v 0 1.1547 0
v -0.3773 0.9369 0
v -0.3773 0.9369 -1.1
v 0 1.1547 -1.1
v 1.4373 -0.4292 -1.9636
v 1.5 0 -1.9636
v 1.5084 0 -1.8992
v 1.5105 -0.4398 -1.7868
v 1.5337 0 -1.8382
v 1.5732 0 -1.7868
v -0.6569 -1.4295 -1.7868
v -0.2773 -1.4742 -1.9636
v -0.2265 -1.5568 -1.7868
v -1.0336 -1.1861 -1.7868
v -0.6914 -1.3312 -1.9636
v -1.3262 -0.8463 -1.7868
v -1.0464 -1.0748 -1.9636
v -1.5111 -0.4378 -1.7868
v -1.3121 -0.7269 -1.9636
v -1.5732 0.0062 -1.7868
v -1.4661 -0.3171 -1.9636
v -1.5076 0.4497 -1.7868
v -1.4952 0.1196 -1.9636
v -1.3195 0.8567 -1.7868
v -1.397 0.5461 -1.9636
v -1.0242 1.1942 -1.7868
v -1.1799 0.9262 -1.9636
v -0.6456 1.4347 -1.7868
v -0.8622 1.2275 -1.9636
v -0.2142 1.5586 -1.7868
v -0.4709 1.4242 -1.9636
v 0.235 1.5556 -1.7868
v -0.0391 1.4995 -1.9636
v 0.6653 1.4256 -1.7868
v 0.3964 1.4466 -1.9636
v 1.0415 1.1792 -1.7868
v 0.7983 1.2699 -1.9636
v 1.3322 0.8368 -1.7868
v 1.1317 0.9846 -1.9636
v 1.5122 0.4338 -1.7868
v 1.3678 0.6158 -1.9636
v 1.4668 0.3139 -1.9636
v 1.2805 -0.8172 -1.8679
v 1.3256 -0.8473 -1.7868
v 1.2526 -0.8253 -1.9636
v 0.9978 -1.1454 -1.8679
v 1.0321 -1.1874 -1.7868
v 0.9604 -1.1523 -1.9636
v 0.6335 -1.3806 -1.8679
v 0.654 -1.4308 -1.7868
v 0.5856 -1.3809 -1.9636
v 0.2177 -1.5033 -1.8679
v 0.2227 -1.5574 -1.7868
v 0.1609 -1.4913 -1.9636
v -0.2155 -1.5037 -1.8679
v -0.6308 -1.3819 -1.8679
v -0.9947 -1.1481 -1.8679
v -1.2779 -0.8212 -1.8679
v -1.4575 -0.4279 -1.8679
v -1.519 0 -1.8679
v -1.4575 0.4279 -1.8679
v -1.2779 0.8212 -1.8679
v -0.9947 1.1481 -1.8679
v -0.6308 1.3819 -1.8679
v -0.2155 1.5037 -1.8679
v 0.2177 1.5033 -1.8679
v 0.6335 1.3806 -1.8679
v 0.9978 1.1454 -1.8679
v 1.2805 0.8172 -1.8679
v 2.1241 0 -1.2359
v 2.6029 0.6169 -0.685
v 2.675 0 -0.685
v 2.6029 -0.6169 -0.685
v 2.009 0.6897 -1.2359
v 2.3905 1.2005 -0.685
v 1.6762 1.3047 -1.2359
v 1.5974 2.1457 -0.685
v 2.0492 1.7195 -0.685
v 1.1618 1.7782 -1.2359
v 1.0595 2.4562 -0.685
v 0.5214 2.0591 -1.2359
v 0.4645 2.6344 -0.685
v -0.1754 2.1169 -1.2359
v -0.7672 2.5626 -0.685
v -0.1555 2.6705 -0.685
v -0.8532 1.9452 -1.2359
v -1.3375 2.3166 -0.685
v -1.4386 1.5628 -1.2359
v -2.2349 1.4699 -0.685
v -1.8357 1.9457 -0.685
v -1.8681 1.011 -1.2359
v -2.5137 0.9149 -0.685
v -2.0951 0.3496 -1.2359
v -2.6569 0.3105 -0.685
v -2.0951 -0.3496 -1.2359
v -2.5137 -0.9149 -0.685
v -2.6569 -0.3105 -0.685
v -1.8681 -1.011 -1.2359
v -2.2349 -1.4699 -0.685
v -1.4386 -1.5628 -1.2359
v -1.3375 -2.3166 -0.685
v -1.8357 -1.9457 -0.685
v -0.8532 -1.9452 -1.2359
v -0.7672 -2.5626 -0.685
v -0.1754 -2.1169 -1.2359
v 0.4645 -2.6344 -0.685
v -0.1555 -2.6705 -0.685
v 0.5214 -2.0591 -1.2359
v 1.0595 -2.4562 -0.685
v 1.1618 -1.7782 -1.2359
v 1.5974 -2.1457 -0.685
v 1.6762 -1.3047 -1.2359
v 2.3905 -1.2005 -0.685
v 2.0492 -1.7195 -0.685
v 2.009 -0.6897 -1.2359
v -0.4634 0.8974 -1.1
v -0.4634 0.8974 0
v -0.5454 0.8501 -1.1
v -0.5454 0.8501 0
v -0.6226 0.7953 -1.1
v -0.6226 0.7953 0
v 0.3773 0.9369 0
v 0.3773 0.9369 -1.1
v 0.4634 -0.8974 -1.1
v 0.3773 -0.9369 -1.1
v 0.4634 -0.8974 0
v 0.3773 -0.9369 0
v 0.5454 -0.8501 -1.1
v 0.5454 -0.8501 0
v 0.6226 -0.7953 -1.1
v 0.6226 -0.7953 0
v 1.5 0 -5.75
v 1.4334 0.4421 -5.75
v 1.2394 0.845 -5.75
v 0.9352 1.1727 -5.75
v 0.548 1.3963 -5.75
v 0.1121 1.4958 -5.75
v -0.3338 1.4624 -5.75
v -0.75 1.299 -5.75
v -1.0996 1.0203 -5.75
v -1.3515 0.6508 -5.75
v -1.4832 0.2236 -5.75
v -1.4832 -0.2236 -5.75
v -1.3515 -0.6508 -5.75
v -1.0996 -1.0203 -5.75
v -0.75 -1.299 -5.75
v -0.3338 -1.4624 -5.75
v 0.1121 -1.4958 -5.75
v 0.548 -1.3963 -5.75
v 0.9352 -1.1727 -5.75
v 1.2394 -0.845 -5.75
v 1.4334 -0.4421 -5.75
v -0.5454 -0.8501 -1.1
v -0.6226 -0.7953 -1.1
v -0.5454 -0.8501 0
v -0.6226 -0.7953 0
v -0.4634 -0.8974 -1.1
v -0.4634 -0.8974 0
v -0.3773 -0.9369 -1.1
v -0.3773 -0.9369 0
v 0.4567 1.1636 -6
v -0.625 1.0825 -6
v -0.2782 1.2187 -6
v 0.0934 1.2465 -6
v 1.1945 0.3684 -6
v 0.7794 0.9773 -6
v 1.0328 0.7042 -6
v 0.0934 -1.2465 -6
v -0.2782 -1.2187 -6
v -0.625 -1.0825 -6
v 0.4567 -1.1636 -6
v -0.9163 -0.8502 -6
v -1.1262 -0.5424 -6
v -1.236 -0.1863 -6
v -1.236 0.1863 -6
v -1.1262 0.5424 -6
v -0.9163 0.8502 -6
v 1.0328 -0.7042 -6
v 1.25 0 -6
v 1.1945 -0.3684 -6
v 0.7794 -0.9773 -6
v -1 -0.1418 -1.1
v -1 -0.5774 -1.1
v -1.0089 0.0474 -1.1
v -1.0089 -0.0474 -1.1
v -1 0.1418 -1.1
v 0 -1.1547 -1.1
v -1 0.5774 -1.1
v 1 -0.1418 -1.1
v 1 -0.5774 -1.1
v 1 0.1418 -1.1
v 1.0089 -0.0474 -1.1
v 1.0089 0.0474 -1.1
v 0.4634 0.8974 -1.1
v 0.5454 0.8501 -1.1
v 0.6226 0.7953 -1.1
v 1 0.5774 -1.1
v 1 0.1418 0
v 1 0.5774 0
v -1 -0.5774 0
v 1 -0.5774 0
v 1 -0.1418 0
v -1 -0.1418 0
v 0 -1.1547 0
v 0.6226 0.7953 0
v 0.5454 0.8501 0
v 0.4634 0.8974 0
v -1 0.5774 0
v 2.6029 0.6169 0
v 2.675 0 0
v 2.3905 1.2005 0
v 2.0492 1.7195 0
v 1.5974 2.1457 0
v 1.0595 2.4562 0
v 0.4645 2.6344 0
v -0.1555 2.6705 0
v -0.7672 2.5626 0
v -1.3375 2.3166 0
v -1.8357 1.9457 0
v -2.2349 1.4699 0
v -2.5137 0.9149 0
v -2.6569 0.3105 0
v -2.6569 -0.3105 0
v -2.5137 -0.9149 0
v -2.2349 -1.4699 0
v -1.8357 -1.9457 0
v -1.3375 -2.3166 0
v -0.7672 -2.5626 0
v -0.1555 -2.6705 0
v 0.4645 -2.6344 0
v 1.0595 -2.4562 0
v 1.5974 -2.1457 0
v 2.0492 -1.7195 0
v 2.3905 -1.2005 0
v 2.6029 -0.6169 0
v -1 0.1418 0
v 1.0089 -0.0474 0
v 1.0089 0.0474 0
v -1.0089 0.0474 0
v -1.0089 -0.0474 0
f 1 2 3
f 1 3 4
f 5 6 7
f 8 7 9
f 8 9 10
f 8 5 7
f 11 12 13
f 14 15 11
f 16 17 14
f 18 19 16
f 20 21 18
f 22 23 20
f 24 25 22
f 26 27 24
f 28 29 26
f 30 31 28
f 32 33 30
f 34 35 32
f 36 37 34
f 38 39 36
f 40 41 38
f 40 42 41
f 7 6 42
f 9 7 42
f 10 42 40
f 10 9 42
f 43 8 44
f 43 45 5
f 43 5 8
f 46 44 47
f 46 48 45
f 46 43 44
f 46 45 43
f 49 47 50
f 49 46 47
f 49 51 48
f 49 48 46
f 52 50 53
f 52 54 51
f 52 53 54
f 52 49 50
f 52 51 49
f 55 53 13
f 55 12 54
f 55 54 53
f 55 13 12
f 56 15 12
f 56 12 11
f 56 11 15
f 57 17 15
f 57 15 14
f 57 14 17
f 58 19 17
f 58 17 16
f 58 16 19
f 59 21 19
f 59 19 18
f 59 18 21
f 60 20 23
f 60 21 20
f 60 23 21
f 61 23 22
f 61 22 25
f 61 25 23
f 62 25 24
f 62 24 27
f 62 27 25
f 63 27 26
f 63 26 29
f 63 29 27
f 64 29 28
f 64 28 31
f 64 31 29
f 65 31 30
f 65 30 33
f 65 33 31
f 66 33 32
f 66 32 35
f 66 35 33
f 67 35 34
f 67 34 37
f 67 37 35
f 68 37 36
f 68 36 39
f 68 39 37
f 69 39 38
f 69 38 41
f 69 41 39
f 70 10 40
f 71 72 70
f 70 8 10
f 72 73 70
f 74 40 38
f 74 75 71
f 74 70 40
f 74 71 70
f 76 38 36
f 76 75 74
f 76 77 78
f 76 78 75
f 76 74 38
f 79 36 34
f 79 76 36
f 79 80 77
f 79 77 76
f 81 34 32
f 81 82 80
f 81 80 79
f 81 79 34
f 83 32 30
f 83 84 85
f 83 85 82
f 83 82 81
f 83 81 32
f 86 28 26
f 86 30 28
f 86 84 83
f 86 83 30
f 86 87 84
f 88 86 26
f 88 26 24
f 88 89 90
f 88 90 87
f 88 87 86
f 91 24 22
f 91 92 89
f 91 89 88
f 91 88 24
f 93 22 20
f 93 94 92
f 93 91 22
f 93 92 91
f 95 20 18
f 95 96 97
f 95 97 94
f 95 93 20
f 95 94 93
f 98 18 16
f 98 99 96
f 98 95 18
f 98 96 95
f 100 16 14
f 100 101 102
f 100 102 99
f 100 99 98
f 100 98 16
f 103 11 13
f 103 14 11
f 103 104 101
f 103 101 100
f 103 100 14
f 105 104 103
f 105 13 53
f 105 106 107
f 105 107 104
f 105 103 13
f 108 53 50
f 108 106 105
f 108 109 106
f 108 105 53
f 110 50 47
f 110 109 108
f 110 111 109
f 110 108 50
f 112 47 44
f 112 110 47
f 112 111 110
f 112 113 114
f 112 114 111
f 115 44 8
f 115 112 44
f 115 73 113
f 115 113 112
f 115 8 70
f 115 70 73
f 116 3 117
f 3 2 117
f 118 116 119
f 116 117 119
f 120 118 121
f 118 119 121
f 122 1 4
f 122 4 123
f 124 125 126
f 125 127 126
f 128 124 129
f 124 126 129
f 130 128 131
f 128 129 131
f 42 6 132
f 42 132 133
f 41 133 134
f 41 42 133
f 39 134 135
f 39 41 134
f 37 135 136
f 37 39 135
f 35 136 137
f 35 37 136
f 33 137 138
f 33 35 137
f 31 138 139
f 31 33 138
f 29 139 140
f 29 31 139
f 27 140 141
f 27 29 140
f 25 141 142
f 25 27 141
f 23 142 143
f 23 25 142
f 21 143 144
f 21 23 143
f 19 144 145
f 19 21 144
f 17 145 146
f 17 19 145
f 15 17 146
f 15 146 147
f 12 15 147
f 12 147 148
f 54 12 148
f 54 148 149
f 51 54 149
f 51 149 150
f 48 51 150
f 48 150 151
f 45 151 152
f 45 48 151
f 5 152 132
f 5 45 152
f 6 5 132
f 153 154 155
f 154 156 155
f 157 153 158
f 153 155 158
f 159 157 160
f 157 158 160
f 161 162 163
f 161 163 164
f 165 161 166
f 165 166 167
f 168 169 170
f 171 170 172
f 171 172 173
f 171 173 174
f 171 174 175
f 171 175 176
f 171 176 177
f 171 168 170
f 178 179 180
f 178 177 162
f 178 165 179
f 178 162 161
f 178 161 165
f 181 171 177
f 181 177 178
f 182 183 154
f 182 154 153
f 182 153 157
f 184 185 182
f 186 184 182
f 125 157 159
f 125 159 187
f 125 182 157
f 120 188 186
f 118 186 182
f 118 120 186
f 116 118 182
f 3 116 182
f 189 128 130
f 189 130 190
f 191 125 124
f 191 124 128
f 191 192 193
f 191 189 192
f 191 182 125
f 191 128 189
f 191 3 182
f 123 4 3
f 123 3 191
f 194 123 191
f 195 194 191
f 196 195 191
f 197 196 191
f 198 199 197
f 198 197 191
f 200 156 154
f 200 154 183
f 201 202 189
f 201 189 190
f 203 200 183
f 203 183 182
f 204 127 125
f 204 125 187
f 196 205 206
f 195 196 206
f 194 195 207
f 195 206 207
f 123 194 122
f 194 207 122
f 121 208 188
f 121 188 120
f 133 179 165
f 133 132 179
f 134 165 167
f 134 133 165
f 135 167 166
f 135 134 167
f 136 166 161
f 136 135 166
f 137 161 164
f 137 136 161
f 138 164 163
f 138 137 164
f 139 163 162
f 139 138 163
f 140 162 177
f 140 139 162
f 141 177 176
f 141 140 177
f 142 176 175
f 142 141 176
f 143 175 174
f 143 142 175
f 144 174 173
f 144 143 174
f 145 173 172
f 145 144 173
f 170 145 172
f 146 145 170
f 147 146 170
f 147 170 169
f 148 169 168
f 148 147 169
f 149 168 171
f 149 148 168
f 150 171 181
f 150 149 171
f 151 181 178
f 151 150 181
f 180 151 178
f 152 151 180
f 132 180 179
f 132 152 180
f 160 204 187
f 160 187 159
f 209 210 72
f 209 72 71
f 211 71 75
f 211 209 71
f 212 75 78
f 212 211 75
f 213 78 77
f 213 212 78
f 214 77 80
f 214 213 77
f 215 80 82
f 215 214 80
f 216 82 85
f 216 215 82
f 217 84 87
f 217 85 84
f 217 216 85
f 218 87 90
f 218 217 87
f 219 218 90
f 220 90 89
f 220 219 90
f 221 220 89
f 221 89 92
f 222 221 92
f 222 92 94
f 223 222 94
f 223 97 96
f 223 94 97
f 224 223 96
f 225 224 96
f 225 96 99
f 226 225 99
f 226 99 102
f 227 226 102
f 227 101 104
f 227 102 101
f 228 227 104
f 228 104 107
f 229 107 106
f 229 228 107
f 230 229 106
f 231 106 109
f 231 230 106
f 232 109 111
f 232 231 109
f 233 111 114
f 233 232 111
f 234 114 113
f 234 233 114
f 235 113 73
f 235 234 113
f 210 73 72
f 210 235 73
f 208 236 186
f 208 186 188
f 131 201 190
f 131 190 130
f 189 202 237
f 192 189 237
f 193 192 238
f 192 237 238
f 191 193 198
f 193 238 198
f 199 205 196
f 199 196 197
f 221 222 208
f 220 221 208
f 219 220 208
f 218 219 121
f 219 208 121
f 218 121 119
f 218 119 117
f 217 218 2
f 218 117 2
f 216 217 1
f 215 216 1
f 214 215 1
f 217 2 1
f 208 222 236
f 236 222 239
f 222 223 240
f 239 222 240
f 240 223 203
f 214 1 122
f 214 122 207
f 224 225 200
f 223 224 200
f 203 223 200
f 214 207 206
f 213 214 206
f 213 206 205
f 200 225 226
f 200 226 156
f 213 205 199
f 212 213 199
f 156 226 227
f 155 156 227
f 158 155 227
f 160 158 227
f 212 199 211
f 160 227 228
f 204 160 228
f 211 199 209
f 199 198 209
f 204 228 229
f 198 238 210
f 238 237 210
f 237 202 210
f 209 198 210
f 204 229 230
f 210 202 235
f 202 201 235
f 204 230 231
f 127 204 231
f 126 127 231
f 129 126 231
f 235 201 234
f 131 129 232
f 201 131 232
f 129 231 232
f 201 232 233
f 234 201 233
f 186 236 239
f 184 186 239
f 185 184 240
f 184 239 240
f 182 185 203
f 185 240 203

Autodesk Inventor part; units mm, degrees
ref_plane "YZ Plane" through (0, 0, 0) normal (1, 0, 0) x (0, 1, 0)
sketch "Esquisse2" plane through (0, 0, 0) normal (0, 1, 0) x (-1, 0, 0)
  line L0 (0, -6) -> (-1.5, -6)
  line L1 (0, 0) -> (0, -6)
  line L2 (-2.675, 0) -> (0, 0)
  line L3 (-2.675, -0.685) -> (-2.675, 0)
  line L4 (-1.5, -1.86) -> (-2.675, -0.685)
  line L5 (-1.5, -6) -> (-1.5, -1.86)
  line L6 (0, 0) -> (0, -6)
  dimension "d2" = 45
  dimension "d4" = 1.5
  dimension "d6" = 2.675
  dimension "d8" = 1.86
  dimension "d10" = 6
revolve "Révolution1" add sketch "Esquisse2" angle 360 about axis through (0, 0, 0) along (0, 0, -1)
fillet "Congé1" radius 0.25 1 edges at (-1.5, 0, -1.86)
chamfer "Chanfrein1" distance 0.25 angle 45 1 edges at (-1.5, 0, -6)
sketch "Esquisse4" plane through (0, 0, 0) normal (0, 0, 1) x (1, 0, 0)
  circle A0 centre (0, 0) radius 2.675 projected
  circle A1 centre (0, 0) radius 1 construction
  line L0 (-1, -0.5774) -> (-1, 0.5774)
  line L1 (-1, 0.5774) -> (0, 1.1547)
  line L2 (0, 1.1547) -> (1, 0.5774)
  line L3 (1, 0.5774) -> (1, -0.5774)
  line L4 (1, -0.5774) -> (0, -1.1547)
  line L5 (0, -1.1547) -> (-1, -0.5774)
  dimension "d27" = 2
extrude "Extrusion1" cut sketch "Esquisse4" against normal blind 1.1 contours L0 L1 L2 L3 L4 L5
sketch "Esquisse5" plane through (0, 0, 0) normal (0, 0, 1) x (1, 0, 0)
  circle A0 centre (0, 0) radius 2.675 projected
  circle A1 centre (0, 0) radius 1.01
  dimension "d38" = 2.02
extrude "Extrusion2" cut sketch "Esquisse5" against normal blind 1.1 contours A1
thread "Filetage1" size "M3x0.5" class "4g6g" standard "ANSI Metric M Profile" length 3.14
ref_plane "MSC_PF1" through (0, 0, 0) normal (1, 0, 0) x (0, 1, 0)
ref_plane "MSC_PT1" through (2.675, 0, -0.685) normal (0, 0, -1) x (-1, 0, 0)
equation "\"d4\" = 0.5 * NND"
equation "\"d6\" = 0.5 * ParA"
equation "\"d8\" = ParH"
equation "\"d10\" = NLG"
equation "\"d27\" = ParJ"
equation "\"d39\" = Tt"
equation "\"d24\" = Rr"
equation "\"d25\" = 0.5 * PTC"
equation "\"d26\" = 0.5 * PTC"
equation "\"d28\" = Tt"
equation "\"d31\" = Lt"
equation "\"d38\" = 1.01 * ParJ"
equation "\"NND\" = 3"
equation "\"NLG\" = 6"
equation "\"PTC\" = 0.5"
equation "\"ParA\" = 5.35"
equation "\"ParH\" = 1.86"
equation "\"ParJ\" = 2"
equation "\"Tt\" = 1.1"
equation "\"Rr\" = 0.25"
equation "\"msp_e\" = 0.288675 * ParJ"
equation "\"Lt\" = 3.14"
equation "\"THREADDIA\" = NND"
properties part number "ASME/ANSI B18.3.5M - M3x6(2)" material "Acier, doux"
